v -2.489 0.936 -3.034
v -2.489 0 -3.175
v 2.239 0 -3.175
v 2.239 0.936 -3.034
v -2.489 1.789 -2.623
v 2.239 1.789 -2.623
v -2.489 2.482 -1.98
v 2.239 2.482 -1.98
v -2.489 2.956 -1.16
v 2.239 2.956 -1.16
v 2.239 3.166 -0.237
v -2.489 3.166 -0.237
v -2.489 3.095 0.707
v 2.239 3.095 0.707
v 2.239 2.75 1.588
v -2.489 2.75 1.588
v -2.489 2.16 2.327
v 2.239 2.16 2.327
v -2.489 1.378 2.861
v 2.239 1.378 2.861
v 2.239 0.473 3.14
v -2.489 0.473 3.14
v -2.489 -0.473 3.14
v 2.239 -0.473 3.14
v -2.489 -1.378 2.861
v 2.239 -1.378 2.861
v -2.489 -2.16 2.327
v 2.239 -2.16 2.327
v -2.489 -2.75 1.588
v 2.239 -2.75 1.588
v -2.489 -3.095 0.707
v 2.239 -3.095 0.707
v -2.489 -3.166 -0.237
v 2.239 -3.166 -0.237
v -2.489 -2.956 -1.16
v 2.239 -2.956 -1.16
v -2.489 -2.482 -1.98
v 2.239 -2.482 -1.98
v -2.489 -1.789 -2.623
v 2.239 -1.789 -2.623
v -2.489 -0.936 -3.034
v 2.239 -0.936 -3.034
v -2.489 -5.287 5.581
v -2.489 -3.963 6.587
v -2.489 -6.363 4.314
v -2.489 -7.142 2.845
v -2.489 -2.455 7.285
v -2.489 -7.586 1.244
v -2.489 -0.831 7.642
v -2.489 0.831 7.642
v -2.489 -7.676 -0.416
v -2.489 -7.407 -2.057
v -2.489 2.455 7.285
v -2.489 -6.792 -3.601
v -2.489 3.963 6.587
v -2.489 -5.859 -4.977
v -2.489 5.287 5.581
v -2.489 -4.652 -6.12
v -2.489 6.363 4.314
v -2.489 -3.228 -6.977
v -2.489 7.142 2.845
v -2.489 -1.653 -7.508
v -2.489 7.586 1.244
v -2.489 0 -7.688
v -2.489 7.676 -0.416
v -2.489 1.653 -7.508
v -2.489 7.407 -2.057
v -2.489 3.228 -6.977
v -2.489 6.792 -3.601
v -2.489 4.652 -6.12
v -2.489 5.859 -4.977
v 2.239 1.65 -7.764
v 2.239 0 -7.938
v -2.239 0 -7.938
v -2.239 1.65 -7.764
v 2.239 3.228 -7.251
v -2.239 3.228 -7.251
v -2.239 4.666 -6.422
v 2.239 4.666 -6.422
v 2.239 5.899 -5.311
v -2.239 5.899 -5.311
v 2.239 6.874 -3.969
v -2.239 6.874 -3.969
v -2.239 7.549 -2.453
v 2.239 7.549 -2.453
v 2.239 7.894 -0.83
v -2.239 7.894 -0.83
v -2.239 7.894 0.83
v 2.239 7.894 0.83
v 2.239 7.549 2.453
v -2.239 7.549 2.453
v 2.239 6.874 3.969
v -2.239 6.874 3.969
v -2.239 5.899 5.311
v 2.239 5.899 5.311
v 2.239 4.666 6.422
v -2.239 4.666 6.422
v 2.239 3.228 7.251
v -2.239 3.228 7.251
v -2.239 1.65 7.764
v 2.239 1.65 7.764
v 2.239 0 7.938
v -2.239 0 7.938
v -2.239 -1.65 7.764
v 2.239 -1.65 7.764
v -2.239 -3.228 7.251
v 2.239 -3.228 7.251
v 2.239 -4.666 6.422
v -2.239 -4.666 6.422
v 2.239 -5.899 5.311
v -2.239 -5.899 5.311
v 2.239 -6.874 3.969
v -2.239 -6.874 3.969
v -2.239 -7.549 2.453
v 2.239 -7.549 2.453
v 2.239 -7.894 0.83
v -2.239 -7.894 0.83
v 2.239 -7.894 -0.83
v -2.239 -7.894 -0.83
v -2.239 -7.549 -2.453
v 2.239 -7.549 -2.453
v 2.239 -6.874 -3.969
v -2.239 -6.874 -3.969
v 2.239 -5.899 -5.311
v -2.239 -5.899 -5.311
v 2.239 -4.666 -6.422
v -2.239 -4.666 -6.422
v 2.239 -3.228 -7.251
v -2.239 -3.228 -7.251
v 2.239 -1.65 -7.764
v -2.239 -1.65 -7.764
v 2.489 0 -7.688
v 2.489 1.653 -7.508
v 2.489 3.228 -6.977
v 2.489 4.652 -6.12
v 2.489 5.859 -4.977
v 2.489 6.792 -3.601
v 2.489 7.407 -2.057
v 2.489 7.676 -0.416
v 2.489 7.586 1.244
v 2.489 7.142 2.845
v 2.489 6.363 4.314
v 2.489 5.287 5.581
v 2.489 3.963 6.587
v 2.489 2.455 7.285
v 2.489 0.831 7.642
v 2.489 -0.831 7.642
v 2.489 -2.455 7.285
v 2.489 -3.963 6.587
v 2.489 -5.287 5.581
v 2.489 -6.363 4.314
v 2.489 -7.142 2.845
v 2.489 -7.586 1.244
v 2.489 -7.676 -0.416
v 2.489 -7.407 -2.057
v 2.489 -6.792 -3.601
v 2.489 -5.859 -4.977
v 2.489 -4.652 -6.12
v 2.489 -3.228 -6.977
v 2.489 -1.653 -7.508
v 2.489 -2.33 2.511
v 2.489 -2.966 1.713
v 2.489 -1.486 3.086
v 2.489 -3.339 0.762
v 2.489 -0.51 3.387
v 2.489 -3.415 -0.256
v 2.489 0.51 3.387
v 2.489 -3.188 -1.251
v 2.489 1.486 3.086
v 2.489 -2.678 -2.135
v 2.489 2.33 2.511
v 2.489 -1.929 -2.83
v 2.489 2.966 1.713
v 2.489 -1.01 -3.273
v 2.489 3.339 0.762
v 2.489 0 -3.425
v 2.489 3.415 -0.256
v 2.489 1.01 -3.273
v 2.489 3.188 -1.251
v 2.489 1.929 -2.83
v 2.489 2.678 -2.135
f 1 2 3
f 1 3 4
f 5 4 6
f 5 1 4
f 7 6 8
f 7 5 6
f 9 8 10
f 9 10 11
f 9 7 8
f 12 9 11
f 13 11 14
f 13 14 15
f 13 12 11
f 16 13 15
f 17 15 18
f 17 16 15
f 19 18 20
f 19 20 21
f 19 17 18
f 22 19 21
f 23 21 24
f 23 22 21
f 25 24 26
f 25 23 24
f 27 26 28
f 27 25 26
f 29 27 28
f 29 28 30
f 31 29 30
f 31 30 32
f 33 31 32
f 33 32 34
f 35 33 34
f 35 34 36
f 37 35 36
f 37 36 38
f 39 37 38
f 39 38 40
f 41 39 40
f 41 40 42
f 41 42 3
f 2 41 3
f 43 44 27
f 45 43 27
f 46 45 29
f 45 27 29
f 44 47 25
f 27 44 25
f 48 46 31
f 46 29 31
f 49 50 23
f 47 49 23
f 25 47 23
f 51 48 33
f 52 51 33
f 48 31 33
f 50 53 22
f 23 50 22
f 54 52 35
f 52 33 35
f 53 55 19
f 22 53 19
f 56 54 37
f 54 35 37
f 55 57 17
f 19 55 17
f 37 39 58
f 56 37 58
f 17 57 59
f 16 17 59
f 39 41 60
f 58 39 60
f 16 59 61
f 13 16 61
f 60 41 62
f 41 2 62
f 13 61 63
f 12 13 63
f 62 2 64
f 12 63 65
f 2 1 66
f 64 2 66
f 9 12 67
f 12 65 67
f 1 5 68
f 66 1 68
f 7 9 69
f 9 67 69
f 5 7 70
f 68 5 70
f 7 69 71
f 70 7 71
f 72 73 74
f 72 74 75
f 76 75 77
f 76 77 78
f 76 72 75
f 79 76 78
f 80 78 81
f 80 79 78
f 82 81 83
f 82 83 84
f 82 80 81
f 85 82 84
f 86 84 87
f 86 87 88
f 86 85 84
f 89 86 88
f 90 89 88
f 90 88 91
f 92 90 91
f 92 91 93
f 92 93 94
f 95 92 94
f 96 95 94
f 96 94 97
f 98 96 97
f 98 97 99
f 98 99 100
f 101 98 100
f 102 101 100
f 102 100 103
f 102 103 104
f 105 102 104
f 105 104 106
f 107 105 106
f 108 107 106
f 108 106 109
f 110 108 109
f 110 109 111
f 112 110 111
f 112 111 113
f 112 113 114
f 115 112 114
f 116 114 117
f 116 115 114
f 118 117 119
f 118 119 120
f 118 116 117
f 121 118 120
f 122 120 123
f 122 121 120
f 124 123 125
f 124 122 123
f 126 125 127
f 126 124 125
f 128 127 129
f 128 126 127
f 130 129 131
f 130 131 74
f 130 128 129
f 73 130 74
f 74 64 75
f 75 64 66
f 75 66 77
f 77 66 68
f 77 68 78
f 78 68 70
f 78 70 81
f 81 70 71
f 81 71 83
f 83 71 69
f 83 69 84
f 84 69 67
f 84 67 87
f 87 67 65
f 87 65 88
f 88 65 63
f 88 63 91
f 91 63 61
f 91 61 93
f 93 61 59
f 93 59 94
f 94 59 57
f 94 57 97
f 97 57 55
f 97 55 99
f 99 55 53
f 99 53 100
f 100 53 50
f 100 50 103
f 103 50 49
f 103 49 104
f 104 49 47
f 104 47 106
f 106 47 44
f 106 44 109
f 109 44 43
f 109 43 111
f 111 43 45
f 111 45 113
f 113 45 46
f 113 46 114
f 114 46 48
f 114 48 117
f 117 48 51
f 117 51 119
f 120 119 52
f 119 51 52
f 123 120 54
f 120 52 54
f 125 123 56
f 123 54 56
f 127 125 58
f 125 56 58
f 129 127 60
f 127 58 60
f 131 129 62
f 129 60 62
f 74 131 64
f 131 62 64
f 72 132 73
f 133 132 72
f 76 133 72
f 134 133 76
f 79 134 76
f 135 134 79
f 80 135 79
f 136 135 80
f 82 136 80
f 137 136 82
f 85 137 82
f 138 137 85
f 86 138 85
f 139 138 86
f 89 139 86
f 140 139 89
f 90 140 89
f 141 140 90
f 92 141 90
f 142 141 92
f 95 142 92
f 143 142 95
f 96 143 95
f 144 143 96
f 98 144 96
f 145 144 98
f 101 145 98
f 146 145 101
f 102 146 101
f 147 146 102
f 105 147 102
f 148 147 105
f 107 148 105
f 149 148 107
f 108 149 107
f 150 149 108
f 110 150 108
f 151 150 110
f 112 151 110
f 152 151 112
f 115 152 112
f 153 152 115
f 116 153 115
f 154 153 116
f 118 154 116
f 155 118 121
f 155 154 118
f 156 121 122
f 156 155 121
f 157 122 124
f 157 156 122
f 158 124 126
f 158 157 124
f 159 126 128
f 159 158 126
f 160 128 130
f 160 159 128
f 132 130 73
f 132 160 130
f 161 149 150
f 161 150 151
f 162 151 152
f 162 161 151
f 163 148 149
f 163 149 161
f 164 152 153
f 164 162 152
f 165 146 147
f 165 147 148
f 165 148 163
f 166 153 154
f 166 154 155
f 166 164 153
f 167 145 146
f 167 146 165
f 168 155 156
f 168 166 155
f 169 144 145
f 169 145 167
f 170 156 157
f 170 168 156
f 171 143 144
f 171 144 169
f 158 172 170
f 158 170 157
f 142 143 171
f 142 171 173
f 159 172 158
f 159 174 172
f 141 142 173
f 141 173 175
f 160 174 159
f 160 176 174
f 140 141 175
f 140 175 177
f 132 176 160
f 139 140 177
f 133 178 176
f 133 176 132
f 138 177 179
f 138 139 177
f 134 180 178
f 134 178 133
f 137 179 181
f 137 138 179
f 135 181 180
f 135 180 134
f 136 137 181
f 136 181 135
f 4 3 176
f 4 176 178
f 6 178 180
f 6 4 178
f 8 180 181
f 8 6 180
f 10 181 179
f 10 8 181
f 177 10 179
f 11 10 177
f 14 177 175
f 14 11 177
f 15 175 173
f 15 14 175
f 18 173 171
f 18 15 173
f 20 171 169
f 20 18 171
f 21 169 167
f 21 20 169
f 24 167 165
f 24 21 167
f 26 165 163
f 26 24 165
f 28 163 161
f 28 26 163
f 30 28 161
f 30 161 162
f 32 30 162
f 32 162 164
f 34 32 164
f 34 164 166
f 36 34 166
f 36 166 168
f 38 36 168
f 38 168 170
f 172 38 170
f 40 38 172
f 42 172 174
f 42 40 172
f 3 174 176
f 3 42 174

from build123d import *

# Parameters (mm, degrees)
SKETCH1_R           = 7.9375
SKETCH1_R_2         = 3.175
BOSS_EXTRUDE1_DEPTH = 2.489
CHAMFER1_SIZE       = 0.25


with BuildPart() as part:
    # Sketch1 → Boss-Extrude1 (new, symmetric)
    with BuildSketch(Plane(origin=(0, 0, 0), x_dir=(0, 0, -1), z_dir=(1, 0, 0))):
        Circle(SKETCH1_R)
        Circle(SKETCH1_R_2, mode=Mode.SUBTRACT)
    extrude(amount=BOSS_EXTRUDE1_DEPTH, both=True)

    # Chamfer1
    chamfer1_edges = [part.edges().sort_by_distance(p)[0] for p in [
        (-2.489, 0, 7.9375),
        (2.489, 0, 7.9375),
        (2.489, 0, 3.175),
    ]]
    chamfer(chamfer1_edges, length=CHAMFER1_SIZE)


solid = part.part
